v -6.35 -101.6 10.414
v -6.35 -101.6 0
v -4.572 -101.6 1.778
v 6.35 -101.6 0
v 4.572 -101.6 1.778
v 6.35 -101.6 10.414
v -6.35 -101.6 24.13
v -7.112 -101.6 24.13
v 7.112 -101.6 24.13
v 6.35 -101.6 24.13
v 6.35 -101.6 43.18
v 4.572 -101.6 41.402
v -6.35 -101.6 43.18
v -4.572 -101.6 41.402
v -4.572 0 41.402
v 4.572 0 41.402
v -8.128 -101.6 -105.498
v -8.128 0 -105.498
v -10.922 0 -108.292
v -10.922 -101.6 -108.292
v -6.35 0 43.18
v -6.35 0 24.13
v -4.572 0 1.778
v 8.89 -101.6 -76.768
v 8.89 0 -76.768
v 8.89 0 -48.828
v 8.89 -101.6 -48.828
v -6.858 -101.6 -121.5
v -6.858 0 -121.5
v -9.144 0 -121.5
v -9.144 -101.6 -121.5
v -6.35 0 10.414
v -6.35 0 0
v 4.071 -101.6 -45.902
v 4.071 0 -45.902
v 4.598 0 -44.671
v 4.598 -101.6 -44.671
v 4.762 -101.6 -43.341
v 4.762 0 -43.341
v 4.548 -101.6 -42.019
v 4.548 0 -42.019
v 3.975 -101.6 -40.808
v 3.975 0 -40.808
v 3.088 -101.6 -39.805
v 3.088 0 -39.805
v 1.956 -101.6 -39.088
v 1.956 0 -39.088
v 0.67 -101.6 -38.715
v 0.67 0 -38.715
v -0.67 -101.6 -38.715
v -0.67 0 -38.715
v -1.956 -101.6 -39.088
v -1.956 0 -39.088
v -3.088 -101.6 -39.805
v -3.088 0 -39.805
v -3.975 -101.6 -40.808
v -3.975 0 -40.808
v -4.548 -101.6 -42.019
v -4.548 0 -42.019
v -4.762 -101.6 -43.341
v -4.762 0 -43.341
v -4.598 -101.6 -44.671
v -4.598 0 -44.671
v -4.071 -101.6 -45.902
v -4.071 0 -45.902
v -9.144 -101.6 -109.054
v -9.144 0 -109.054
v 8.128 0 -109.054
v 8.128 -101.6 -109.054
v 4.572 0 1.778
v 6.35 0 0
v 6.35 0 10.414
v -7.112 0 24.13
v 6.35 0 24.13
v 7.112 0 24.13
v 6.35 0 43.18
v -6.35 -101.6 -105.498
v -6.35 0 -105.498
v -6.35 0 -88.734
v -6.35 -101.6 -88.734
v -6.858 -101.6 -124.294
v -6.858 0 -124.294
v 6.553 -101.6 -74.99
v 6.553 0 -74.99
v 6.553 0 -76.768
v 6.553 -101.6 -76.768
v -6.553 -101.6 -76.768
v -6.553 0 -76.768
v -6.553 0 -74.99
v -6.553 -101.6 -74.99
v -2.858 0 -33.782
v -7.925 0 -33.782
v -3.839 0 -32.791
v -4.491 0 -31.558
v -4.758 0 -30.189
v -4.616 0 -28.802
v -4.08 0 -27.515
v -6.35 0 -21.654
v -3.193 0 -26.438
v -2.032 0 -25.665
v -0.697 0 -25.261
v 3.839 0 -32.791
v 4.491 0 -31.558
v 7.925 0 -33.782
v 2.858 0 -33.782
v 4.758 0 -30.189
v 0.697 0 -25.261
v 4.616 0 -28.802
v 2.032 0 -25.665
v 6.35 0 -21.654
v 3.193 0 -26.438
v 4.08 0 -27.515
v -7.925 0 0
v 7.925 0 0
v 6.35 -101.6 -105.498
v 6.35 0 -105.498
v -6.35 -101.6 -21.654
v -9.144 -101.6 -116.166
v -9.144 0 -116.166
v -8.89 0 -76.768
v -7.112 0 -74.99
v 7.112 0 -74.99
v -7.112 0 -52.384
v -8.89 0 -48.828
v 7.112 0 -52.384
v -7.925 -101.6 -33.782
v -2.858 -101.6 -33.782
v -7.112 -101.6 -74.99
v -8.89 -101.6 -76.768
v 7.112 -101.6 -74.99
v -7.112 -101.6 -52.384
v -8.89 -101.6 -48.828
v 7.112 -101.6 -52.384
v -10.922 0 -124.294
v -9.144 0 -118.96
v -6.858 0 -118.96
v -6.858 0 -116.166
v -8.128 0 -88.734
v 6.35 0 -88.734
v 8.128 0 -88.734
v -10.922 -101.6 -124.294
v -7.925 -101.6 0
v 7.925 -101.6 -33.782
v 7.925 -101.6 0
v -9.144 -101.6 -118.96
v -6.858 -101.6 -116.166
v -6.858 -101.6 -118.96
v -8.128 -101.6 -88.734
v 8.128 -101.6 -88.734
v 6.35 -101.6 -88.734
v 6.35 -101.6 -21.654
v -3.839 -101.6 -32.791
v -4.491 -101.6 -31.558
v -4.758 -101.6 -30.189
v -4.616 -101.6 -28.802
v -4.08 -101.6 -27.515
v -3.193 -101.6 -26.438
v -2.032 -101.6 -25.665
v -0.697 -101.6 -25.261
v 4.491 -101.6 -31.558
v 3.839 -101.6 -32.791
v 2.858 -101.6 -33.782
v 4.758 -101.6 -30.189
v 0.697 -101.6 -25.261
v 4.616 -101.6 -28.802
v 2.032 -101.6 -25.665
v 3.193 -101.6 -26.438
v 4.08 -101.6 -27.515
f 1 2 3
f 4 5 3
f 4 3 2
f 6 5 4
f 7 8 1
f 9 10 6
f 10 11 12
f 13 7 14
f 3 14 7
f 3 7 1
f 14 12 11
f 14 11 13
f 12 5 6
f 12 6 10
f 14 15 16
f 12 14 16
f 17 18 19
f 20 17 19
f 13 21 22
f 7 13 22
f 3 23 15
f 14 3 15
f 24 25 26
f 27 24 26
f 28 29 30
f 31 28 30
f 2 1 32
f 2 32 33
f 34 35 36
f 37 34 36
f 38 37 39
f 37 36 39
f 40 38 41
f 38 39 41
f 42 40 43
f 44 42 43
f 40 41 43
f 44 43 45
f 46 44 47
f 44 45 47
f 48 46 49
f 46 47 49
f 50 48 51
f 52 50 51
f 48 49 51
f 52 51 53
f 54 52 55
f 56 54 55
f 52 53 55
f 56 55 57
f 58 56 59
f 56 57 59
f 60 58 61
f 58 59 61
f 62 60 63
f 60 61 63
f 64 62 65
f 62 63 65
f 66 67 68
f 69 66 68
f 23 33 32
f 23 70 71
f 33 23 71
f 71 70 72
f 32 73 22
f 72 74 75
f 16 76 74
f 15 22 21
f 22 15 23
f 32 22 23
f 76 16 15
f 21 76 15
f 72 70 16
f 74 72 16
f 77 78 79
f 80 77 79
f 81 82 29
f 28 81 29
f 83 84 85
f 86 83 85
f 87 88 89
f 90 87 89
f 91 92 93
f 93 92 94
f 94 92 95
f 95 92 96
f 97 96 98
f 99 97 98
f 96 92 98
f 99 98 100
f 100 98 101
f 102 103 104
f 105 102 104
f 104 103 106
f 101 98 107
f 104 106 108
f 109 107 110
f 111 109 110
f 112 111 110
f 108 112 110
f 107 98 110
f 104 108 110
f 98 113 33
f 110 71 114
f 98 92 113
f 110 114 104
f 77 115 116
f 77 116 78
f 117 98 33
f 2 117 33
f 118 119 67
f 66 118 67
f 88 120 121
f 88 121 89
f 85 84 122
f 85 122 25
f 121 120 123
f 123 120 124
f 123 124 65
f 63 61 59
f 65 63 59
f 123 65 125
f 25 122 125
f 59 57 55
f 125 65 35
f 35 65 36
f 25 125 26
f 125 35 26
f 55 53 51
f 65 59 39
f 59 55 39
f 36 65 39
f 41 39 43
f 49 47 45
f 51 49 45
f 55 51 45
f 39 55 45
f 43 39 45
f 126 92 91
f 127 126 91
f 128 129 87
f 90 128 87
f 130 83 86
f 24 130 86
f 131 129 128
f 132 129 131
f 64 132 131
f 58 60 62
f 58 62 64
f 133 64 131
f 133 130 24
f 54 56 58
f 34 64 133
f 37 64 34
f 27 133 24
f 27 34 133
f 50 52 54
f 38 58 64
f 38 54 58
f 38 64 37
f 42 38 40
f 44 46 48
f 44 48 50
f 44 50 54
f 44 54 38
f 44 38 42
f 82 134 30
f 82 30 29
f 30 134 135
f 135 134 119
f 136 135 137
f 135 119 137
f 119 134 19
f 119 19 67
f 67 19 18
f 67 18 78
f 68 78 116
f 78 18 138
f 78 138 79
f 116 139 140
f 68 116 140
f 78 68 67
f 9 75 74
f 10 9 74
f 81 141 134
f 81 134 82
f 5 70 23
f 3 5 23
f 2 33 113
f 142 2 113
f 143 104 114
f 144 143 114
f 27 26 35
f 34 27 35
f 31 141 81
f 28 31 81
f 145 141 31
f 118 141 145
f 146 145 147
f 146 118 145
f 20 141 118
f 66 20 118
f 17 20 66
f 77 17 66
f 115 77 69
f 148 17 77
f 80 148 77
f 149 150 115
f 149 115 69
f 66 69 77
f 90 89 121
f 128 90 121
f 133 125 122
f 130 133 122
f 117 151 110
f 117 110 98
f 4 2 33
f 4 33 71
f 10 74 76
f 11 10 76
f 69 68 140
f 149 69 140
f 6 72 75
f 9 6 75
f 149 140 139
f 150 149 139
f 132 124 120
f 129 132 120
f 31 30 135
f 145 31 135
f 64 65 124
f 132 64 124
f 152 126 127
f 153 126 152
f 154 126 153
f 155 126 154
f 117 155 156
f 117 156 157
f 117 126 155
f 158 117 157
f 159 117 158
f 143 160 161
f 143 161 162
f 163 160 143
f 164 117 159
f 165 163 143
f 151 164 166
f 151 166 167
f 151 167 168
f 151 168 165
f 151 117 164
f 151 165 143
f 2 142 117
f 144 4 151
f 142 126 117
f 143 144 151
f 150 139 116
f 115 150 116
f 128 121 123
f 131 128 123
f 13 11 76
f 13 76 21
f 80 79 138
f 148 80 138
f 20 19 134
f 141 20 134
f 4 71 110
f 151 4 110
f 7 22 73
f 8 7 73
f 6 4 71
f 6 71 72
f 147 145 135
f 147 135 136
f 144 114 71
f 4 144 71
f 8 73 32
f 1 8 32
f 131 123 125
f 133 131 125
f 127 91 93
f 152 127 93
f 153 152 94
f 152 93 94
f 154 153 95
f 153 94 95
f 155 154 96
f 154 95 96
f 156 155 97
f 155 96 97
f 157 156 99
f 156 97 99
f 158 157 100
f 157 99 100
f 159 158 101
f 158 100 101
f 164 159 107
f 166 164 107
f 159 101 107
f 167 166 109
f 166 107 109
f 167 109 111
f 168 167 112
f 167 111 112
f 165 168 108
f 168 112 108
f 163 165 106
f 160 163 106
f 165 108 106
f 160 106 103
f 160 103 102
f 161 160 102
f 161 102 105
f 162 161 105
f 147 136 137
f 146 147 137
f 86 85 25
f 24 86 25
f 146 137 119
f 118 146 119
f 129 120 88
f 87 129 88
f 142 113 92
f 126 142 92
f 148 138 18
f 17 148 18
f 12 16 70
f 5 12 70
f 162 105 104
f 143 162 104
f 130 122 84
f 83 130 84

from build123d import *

# Parameters (mm, degrees)
F1_DEPTH = 101.6
F3_DEPTH = 101.6
F5_DEPTH = 101.6
F7_DEPTH = 101.6


with BuildPart() as f1:
    # F0 (on Front) → F1 (new body)
    with BuildSketch(Plane.XZ):
        Polygon((0, 0), (6.35, 0), (6.35, 10.414), (7.112, 24.13), (6.35, 24.13), (6.35, 43.18), (0.04771, 43.18), (-0.04771, 43.18), (-6.35, 43.18), (-6.35, 24.13), (-7.112, 24.13), (-6.35, 10.414), (-6.35, 0), align=None)
        Polygon((-4.572, 41.402), (0, 41.402), (4.572, 41.402), (4.572, 1.778), (0, 1.778), (-4.572, 1.778), align=None, mode=Mode.SUBTRACT)
    extrude(amount=F1_DEPTH)


with BuildPart() as f3:
    # F2 (on Front) → F3 (new body)
    with BuildSketch(Plane.XZ):
        with BuildLine():
            Line((7.9248, 0), (6.35, 0))
            Line((6.35, 0), (6.35, -21.6535))
            Line((6.35, -21.6535), (-6.35, -21.6535))
            Line((-6.35, -21.6535), (-6.35, 0))
            Line((-6.35, 0), (-7.9248, 0))
            Line((-7.9248, 0), (-7.9248, -33.782))
            Line((-7.9248, -33.782), (-2.8575, -33.782))
            ThreePointArc((-2.8575, -33.782), (0, -25.2095), (2.8575, -33.782))
            Line((2.8575, -33.782), (7.9248, -33.782))
            Line((7.9248, -33.782), (7.9248, 0))
        make_face()
    extrude(amount=F3_DEPTH)


with BuildPart() as f5:
    # F4 (on Front) → F5 (new body)
    with BuildSketch(Plane.XZ):
        with BuildLine():
            Line((8.89, -48.827907), (4.070926, -45.90204))
            ThreePointArc((4.070926, -45.90204), (0, -38.667907), (-4.070926, -45.90204))
            Line((-4.070926, -45.90204), (-8.89, -48.827907))
            Line((-8.89, -48.827907), (-8.89, -76.767907))
            Line((-8.89, -76.767907), (-6.5532, -76.767907))
            Line((-6.5532, -76.767907), (-6.5532, -74.989907))
            Line((-6.5532, -74.989907), (-7.112, -74.989907))
            Line((-7.112, -74.989907), (-7.112, -52.383907))
            Line((-7.112, -52.383907), (7.112, -52.383907))
            Line((7.112, -52.383907), (7.112, -74.989907))
            Line((7.112, -74.989907), (6.5532, -74.989907))
            Line((6.5532, -74.989907), (6.5532, -76.767907))
            Line((6.5532, -76.767907), (8.89, -76.767907))
            Line((8.89, -76.767907), (8.89, -48.827907))
        make_face()
    extrude(amount=F5_DEPTH)


with BuildPart() as f7:
    # F6 (on Front) → F7 (new body)
    with BuildSketch(Plane.XZ):
        Polygon((-6.35, -105.498136), (-6.35, -88.734136), (-8.128, -88.734136), (-8.128, -105.498136), (-10.922, -108.292136), (-10.922, -124.294136), (-6.858, -124.294136), (-6.858, -121.500136), (-9.144, -121.500136), (-9.144, -118.960136), (-6.858, -118.960136), (-6.858, -116.166136), (-9.144, -116.166136), (-9.144, -109.054136), (8.128, -109.054136), (8.128, -88.734136), (6.35, -88.734136), (6.35, -105.498136), align=None)
    extrude(amount=F7_DEPTH)


solid = Compound([f1.part, f3.part, f5.part, f7.part])
